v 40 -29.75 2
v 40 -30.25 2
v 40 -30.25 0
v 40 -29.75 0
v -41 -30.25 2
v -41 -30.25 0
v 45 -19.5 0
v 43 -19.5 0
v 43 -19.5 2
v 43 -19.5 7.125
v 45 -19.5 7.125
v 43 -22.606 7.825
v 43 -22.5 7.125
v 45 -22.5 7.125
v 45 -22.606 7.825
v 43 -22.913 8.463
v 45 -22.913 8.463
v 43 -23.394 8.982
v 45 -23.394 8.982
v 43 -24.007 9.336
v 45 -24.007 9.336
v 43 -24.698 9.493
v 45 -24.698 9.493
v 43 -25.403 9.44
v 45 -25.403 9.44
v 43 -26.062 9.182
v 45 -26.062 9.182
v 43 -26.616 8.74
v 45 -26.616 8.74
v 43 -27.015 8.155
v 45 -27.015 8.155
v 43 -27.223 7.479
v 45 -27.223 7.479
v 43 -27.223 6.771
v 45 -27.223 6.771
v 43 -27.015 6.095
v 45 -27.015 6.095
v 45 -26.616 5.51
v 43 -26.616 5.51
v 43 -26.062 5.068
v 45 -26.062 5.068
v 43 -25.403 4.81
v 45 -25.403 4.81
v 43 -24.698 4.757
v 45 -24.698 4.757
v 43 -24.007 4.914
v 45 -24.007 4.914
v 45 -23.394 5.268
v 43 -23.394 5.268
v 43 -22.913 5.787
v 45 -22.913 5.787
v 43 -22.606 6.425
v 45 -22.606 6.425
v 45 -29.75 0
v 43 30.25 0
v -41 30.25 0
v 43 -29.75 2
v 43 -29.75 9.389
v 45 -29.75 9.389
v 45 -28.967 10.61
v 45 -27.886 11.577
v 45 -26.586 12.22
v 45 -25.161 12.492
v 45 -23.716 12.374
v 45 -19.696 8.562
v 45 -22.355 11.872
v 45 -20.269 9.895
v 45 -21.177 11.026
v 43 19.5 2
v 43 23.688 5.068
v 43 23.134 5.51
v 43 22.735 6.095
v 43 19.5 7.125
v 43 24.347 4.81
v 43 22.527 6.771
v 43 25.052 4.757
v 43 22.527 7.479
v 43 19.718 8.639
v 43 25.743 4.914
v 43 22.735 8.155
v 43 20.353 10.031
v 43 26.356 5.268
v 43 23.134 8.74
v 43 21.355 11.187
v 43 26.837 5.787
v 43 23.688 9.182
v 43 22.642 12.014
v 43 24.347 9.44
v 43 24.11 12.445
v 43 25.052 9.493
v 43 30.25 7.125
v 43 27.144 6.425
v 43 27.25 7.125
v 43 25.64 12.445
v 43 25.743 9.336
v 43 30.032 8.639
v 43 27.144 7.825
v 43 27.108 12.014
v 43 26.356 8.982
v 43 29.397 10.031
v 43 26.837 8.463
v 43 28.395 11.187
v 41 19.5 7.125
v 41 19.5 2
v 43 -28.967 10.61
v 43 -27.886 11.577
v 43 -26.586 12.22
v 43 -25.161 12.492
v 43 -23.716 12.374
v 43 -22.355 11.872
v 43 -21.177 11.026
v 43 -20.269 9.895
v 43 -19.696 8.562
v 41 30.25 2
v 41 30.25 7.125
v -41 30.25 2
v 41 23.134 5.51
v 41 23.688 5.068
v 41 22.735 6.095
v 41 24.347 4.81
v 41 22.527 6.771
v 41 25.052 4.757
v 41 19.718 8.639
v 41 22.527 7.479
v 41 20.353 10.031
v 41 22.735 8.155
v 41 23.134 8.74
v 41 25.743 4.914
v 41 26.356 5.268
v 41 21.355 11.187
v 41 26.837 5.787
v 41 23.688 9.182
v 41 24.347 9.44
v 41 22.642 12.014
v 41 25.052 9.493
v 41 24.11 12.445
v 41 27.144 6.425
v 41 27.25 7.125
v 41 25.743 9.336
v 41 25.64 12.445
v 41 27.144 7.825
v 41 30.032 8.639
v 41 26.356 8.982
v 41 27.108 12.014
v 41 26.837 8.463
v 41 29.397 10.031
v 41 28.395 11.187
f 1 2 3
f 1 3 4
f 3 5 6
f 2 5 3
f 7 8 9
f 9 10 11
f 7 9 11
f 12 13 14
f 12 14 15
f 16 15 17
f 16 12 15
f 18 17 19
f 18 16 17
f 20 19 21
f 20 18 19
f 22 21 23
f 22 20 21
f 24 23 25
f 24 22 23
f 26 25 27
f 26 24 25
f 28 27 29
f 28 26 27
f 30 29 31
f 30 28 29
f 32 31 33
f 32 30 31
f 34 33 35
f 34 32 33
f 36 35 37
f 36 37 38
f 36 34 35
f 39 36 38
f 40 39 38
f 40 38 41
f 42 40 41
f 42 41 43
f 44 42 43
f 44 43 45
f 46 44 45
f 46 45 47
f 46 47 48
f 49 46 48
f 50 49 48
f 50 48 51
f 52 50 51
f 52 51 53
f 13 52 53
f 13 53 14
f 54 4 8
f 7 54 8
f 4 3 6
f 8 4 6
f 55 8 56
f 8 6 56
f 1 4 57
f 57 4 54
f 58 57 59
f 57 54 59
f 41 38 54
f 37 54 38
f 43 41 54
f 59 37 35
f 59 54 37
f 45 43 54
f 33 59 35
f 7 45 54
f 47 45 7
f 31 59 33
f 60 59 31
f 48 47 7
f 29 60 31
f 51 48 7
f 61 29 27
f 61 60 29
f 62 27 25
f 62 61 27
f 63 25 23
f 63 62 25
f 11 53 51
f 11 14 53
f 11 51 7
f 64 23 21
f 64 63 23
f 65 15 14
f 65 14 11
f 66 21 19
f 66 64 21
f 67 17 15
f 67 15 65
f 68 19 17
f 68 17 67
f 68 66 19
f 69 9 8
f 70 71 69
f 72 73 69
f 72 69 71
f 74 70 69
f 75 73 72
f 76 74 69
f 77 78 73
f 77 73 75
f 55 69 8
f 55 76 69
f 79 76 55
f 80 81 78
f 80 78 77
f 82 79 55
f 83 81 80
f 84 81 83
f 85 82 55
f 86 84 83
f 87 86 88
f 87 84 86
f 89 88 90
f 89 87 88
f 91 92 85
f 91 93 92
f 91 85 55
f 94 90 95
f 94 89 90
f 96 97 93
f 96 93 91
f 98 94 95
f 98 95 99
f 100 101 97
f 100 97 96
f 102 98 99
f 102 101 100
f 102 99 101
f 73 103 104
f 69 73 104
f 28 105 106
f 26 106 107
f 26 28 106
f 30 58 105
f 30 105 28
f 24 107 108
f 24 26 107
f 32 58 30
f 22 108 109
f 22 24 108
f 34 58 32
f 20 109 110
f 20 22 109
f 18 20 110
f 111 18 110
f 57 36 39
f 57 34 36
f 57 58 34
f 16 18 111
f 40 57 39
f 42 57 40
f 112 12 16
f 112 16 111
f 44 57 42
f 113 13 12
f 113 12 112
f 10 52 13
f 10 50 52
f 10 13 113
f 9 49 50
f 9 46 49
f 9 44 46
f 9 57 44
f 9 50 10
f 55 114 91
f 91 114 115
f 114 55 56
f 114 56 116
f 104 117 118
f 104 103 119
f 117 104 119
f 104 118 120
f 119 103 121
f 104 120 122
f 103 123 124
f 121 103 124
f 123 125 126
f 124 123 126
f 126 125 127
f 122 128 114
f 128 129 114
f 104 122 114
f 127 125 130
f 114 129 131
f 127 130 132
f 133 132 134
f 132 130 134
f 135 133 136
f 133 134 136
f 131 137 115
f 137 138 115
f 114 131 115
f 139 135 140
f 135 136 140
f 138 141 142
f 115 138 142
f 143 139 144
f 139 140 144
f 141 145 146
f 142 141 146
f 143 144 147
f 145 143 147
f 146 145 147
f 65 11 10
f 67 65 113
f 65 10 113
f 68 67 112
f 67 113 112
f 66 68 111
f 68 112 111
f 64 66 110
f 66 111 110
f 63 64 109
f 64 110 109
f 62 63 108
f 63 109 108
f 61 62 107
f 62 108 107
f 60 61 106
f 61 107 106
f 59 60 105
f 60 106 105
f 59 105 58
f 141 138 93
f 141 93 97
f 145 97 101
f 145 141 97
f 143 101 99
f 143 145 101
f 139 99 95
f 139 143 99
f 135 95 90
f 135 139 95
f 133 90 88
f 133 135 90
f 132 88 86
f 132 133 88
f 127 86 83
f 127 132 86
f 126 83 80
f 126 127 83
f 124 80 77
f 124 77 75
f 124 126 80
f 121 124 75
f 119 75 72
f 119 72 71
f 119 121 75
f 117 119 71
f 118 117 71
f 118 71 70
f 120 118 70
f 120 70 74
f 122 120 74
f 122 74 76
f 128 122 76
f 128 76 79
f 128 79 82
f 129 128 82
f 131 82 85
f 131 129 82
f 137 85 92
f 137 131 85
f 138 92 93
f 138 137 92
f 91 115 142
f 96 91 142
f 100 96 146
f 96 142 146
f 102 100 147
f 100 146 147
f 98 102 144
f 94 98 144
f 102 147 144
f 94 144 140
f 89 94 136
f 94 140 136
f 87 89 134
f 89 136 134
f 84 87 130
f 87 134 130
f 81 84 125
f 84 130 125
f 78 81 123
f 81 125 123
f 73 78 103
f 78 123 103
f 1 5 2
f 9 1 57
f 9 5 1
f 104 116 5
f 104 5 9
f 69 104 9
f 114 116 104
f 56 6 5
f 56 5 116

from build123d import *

# Parameters (mm, degrees)
F0_W     = 82
F0_H     = 60.5
F1_DEPTH = 2
F2_R     = 2.375
F3_DEPTH = 2
F4_DEPTH = 4
F5_DEPTH = 2
F6_W     = 2
F6_H     = 10.75
F7_DEPTH = 10.501
F8_W     = 0.5
F8_H     = 10
F9_DEPTH = 5


with BuildPart() as f1:
    # F0 (on Top) → F1 (new body)
    with BuildSketch(Plane.XY):
        Rectangle(F0_W, F0_H)
    extrude(amount=F1_DEPTH)

    # F2 (on face) → F3 (join)
    with BuildSketch(Plane.YZ.offset(41)):
        Polygon((19.5, 2), (-19.5, 2), (-30.25, 2), (-30.25, 0), (30.25, 0), (30.25, 2), align=None)
        with BuildLine():
            Line((19.5, 7.125), (19.5, 2))
            Line((19.5, 2), (30.25, 2))
            Line((30.25, 2), (30.25, 7.125))
            ThreePointArc((30.25, 7.125), (24.875, 12.5), (19.5, 7.125))
        make_face()
        with Locations((24.875, 7.125)):
            Circle(F2_R, mode=Mode.SUBTRACT)
    extrude(amount=F3_DEPTH)

    # F2 (on face) → F4 (join)
    with BuildSketch(Plane.YZ.offset(41)):
        with BuildLine():
            Line((-30.25, 2), (-19.5, 2))
            Line((-19.5, 2), (-19.5, 7.125))
            ThreePointArc((-19.5, 7.125), (-24.875, 12.5), (-30.25, 7.125))
            Line((-30.25, 7.125), (-30.25, 2))
        make_face()
        with Locations((-24.875, 7.125)):
            Circle(F2_R, mode=Mode.SUBTRACT)
    extrude(amount=F4_DEPTH)

    # F5 (add): a face of the model
    f5_faces = [f1.faces().sort_by_distance(p)[0] for p in [
        (44, -24.875, 2),
    ]]
    extrude(f5_faces, amount=F5_DEPTH)

    # F6 (on face) → F7 (cut, through all)
    with BuildSketch(Plane.XY.offset(2)):
        with Locations((42, -24.875)):
            Rectangle(F6_W, F6_H)
    extrude(amount=F7_DEPTH, mode=Mode.SUBTRACT)

    # F8 (on face) → F9 (cut)
    with BuildSketch(Plane.YZ.offset(45)):
        with Locations((-30, 5)):
            Rectangle(F8_W, F8_H)
    extrude(amount=-F9_DEPTH, mode=Mode.SUBTRACT)


solid = f1.part
